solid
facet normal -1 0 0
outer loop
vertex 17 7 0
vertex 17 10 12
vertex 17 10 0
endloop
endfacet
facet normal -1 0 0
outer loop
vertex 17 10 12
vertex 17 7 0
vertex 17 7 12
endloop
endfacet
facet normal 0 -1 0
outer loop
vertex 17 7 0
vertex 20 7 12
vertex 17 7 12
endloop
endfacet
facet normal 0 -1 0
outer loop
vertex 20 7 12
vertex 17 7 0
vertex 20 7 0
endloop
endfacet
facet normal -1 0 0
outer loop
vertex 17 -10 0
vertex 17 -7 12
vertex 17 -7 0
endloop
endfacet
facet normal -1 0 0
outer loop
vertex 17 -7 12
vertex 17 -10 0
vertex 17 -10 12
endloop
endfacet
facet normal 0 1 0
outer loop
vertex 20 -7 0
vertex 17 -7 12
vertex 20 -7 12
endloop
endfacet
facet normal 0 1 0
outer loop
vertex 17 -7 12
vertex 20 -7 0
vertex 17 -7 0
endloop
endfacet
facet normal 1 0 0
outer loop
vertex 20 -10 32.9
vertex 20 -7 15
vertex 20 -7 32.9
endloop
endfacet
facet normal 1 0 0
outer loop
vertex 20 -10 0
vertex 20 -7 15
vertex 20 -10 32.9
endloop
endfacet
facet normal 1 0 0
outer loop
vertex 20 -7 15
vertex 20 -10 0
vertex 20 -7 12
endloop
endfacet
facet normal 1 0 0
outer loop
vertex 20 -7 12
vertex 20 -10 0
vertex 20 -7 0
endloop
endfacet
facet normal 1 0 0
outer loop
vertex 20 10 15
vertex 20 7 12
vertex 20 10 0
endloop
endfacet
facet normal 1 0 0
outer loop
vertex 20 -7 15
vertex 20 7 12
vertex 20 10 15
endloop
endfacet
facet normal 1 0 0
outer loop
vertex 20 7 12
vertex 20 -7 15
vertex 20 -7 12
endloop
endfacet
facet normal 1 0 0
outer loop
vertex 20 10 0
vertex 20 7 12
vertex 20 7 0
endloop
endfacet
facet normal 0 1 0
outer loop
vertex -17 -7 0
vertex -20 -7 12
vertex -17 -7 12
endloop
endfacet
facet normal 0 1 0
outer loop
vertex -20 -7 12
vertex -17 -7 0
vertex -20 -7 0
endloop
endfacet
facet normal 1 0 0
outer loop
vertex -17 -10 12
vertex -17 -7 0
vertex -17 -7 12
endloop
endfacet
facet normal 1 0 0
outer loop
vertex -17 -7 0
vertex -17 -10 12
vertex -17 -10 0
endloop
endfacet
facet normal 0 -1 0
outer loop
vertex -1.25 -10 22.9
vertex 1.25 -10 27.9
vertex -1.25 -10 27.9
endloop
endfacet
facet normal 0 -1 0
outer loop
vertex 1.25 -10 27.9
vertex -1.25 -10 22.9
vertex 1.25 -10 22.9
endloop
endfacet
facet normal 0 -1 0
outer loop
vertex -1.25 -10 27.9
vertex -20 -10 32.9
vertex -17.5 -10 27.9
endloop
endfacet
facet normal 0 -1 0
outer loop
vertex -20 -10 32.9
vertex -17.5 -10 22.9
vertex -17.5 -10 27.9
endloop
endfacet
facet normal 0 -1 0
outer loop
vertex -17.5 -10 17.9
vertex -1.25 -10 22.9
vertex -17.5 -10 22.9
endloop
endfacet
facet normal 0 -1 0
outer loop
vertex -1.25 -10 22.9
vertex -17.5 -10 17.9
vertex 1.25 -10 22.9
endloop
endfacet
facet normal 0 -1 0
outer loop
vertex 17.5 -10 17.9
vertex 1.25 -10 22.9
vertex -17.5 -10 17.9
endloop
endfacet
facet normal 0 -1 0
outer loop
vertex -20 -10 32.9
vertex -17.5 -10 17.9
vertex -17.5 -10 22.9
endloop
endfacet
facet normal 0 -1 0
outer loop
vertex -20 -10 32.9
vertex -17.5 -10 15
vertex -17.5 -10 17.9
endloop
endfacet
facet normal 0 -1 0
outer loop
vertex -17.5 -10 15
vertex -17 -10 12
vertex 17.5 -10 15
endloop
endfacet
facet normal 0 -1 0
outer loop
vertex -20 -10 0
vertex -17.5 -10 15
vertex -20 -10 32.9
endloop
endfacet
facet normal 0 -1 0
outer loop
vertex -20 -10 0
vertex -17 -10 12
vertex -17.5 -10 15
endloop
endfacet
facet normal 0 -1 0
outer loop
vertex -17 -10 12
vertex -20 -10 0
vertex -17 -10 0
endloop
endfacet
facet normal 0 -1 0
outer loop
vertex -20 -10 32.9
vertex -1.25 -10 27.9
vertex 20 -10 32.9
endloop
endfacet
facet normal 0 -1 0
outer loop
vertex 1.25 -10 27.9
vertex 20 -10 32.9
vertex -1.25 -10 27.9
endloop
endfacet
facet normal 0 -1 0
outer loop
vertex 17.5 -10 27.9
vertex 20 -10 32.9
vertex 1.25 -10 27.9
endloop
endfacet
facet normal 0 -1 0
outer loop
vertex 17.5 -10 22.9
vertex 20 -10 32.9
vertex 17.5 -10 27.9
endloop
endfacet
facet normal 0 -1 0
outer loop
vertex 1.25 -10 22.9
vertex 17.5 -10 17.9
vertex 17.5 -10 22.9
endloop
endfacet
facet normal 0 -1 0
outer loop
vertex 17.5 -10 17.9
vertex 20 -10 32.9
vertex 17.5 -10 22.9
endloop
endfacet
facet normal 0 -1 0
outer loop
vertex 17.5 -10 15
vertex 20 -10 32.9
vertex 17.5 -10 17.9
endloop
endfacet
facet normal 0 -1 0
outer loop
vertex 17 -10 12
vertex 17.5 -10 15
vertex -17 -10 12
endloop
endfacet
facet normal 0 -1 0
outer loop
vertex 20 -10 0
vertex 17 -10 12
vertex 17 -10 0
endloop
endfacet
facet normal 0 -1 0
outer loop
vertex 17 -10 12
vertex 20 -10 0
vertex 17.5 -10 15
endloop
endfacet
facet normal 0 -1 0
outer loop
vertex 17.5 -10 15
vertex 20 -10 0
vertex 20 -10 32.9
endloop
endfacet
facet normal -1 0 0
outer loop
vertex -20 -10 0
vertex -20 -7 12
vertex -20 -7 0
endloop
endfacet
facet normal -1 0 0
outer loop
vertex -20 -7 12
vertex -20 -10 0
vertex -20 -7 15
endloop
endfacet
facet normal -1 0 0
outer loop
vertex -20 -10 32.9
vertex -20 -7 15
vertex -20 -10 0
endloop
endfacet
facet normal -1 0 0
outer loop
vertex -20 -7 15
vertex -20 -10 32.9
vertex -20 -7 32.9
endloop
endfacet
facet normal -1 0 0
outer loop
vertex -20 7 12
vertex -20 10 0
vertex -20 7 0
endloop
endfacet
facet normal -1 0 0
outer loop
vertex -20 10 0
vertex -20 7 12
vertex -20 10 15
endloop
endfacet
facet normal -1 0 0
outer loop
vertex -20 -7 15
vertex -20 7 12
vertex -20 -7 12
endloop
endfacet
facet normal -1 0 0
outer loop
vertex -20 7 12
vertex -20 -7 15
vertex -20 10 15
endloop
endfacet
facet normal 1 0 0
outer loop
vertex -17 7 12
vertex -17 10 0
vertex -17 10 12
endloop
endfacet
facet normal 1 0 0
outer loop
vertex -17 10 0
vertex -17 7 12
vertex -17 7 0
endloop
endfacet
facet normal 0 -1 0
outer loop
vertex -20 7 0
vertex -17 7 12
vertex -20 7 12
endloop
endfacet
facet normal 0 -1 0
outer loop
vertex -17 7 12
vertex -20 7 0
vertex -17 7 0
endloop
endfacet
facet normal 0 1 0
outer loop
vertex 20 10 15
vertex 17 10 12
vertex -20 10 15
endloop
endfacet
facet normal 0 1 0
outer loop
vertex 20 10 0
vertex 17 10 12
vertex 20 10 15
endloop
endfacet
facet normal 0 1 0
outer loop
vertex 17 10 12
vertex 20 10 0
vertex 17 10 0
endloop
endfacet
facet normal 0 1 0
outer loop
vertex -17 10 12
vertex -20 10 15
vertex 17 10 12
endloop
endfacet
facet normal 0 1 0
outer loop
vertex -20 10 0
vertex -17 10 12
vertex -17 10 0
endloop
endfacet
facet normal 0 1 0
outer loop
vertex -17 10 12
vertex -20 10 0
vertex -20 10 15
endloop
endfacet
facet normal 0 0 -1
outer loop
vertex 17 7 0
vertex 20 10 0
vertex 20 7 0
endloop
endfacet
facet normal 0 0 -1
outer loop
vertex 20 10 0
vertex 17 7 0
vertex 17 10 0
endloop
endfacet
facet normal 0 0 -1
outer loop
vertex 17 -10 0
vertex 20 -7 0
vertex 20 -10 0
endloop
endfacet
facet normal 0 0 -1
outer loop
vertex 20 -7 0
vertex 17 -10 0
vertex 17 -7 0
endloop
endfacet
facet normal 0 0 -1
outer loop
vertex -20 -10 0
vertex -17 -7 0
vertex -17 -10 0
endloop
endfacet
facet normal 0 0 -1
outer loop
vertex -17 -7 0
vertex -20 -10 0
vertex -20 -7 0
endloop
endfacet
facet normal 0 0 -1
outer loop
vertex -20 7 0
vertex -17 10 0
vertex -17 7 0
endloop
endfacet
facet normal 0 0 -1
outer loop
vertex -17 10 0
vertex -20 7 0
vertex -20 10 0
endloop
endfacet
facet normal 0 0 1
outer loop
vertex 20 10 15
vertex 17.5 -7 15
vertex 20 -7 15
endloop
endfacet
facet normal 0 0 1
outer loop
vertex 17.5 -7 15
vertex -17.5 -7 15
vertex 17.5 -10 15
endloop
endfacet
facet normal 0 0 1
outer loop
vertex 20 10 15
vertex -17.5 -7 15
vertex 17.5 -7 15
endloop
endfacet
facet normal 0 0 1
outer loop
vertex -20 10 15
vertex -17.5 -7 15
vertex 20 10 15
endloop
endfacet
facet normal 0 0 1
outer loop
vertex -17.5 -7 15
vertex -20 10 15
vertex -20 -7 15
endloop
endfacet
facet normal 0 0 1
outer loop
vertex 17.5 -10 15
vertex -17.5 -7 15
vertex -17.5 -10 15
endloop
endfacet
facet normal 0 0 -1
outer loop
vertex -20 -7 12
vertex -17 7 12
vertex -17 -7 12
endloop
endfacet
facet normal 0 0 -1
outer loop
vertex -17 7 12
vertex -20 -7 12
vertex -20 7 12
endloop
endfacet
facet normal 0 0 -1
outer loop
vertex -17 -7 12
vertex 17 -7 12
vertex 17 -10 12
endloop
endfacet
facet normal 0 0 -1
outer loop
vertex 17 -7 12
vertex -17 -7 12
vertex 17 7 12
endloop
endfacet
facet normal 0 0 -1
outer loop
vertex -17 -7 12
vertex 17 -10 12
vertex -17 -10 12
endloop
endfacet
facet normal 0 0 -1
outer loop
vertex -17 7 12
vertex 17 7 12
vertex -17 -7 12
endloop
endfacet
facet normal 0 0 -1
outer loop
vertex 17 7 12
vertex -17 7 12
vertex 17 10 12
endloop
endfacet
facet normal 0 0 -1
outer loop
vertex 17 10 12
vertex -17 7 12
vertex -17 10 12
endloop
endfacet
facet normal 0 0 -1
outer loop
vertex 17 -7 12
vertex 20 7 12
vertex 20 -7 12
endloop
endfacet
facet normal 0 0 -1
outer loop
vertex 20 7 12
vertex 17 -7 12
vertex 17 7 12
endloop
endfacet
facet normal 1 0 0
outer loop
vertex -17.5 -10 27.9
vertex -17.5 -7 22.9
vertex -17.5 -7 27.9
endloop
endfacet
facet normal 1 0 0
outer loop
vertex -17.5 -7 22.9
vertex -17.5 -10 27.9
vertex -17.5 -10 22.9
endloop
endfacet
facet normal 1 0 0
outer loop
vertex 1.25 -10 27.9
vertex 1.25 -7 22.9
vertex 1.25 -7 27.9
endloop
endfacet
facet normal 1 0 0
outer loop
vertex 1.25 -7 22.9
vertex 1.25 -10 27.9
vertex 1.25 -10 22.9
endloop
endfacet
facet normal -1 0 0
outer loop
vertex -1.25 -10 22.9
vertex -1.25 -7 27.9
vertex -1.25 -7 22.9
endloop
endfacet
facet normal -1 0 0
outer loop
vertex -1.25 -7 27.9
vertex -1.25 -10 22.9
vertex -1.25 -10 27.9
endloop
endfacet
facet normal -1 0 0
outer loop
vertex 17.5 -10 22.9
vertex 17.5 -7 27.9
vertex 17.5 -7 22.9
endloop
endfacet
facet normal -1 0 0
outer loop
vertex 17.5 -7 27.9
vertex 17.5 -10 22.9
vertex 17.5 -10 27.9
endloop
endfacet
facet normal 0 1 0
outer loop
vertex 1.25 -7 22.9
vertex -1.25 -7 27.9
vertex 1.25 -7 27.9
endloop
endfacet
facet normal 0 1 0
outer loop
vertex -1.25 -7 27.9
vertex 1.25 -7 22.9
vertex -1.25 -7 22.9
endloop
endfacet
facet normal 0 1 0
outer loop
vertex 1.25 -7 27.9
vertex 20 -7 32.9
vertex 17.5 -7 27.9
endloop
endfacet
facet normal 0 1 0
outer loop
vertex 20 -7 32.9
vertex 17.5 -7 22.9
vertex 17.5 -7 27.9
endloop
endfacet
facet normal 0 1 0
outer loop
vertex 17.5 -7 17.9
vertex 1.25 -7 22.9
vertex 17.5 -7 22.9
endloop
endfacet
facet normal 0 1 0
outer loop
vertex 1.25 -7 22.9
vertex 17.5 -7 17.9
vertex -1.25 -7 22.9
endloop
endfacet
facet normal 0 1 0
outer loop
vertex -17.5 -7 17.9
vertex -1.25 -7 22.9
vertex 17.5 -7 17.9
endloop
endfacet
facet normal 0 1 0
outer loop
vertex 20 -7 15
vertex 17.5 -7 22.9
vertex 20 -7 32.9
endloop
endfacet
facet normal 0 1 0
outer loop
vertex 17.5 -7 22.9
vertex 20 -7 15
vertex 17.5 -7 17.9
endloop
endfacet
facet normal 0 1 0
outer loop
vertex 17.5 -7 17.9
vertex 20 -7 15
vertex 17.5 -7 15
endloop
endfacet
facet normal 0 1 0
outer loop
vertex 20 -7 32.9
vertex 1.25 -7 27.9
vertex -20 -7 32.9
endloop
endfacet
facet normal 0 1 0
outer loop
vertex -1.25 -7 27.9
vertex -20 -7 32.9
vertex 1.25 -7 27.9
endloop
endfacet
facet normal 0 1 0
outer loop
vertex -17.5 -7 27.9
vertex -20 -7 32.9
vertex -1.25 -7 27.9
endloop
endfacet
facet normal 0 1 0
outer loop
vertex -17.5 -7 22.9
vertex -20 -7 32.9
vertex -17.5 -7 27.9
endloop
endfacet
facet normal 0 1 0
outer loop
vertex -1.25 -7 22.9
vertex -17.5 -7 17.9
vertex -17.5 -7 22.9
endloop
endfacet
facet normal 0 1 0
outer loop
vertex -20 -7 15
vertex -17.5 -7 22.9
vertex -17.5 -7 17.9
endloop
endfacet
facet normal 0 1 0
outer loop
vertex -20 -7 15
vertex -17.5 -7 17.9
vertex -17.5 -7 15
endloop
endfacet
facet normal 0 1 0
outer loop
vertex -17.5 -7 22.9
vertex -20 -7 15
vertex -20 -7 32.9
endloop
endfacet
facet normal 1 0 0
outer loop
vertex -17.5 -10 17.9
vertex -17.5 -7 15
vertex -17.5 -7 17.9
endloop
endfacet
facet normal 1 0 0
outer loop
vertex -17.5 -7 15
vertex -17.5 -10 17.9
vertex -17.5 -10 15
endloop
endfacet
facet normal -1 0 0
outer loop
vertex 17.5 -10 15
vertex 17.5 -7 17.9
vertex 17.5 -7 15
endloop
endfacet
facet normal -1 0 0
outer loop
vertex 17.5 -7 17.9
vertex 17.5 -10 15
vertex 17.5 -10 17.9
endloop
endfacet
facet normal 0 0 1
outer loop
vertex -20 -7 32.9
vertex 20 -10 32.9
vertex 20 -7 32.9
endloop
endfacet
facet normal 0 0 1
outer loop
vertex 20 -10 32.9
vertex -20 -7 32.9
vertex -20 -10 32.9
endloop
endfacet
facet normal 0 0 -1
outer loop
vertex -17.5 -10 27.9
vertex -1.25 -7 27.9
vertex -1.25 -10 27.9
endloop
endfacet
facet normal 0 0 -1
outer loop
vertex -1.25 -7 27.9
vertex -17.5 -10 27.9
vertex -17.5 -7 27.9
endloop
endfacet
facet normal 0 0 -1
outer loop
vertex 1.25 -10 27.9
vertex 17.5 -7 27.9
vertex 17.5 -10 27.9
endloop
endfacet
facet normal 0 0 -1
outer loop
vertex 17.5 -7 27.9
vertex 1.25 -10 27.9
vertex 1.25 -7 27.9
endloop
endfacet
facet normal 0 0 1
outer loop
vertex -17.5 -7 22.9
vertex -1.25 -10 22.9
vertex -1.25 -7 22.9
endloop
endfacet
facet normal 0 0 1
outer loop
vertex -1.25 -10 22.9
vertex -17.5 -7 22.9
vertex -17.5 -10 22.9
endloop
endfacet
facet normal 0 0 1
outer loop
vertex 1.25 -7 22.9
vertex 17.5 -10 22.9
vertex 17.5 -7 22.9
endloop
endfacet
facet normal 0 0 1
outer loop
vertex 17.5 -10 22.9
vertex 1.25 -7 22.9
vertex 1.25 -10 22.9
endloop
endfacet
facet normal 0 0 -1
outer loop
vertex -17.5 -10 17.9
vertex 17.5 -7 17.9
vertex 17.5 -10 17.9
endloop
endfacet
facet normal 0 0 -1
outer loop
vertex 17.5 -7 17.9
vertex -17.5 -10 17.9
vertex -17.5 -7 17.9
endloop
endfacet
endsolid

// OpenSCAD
length = 20;
width  =25;
depth = 3.5;;

// parametersfor the  legs  - legs have square cross section

cross =3;
leg_length =20;





echo(" length table is ", length, " mm");
 echo(" width table is ", width, " mm");
echo(" depth table top is ", depth, " mm");
 echo(" width table leg is ", cross, " mm");
 echo(" height table leg is ", leg_length, " mm");
 echo(" overall height table  is ", leg_length + depth, " mm");


overall_height = 25;
leg_len =3;
width_vertical_bar = 3;
width_horizontal_bar =7;

overall_width = width;
thickness =cross;


union()
{
translate([0,0,leg_length+depth])
rotate([180,0,0])
table();
translate([0,-l+thickness,hoh + leg_len + leg_length +  depth-0.1 ])
rotate([90,0,0])
chair_back();

}





l = length/2;
w = width/2;

how = overall_width/2;
hoh = overall_height/2;
ll = -hoh - leg_len;
wvb = width_vertical_bar;
whb = width_horizontal_bar;
hwvb = wvb/2;









module table()
{

/*
   polyhedron command
  by pmoews
*/
polyhedron
       (points = [
                 [ -w,  l, 0],
                 [ -w, -l, 0],
                 [  w, -l, 0],
                 [  w,  l, 0],
                 [ -w,  l,  depth],
                 [ -w, -l,  depth],
                 [  w, -l,  depth],
                 [  w,  l,  depth],
                 [  w-cross, -l,  depth],
                 [  w-cross, cross-l,  depth],
                 [  w, cross-l,  depth],
                 [  w, -l,  leg_length + depth],
                 [  w-cross, -l,  leg_length + depth],
                 [  w-cross, cross-l,  leg_length + depth],
                 [  w, cross-l,  leg_length + depth],
                 [  w,  l-cross,  depth],
                 [  w-cross,  l-cross,  depth],
                 [  w-cross,  l,  depth],
                 [  w,  l,  leg_length + depth],
                 [  w,  l-cross,  leg_length + depth],
                 [  w-cross,  l-cross,  leg_length + depth],
                 [  w-cross,  l,  leg_length + depth],
                 [ cross-w,  l,  depth],
                 [ cross-w,  l-cross,  depth],
                 [ -w,  l-cross,  depth],
                 [ -w,  l,  leg_length + depth],
                 [ cross-w,  l,  leg_length + depth],
                 [ cross-w,  l-cross,  leg_length + depth],
                 [ -w,  l-cross,  leg_length + depth],
                 [ -w, cross-l,  depth],
                 [ cross-w, cross-l,  depth],
                 [ cross-w, -l,  depth],
                 [ -w, -l,  leg_length + depth],
                 [ -w, cross-l,  leg_length + depth],
                 [ cross-w, cross-l,  leg_length + depth],
                 [ cross-w, -l,  leg_length + depth],
                ],
           triangles = [
                 [   14,   10,   11],[    6,   11,   10],
                 [   11,    6,   12],[    8,   12,    6],
                 [   12,    8,   13],[    9,   13,    8],
                 [   13,    9,   14],[    9,   10,   14],
                 [   17,   21,   16],[   20,   16,   21],
                 [   16,   20,   15],[   19,   15,   20],
                 [   15,   19,    7],[   18,    7,   19],
                 [    7,   18,   17],[   18,   21,   17],
                 [   24,   28,   23],[   27,   23,   28],
                 [   23,   27,   22],[   26,   22,   27],
                 [   22,   26,    4],[   25,    4,   26],
                 [    4,   25,   24],[   25,   28,   24],
                 [   31,   35,   30],[   34,   30,   35],
                 [   30,   34,   29],[   33,   29,   34],
                 [   29,   33,    5],[   32,    5,   33],
                 [    5,   32,   31],[   32,   35,   31],
                 [   13,   14,   11],[   13,   11,   12],
                 [   20,   21,   18],[   20,   18,   19],
                 [   27,   28,   25],[   27,   25,   26],
                 [   34,   35,   32],[   34,   32,   33],
                 [    2,    3,    0],[    2,    0,    1],
                 [   16,    9,   30],[   16,   30,   23],
                 [   10,    2,    6],[    7,    3,   15],
                 [   10,   15,    3],[   10,    3,    2],
                 [    7,   17,    3],[   22,    4,    0],
                 [    0,    3,   17],[    0,   17,   22],
                 [    4,   24,    0],[   29,    5,    1],
                 [    1,    0,   24],[    1,   24,   29],
                 [    5,   31,    1],[    8,    6,    2],
                 [    2,    1,   31],[    2,   31,    8],
                 [   10,    9,   16],[   10,   16,   15],
                 [   24,   23,   30],[   24,   30,   29],
                 [    9,    8,   31],[    9,   31,   30],
                 [   17,   16,   23],[   17,   23,   22],
                 ]
      );

}



module chair_back()
{


/*
   polyhedron command by
   pmoews
*/
polyhedron
       (points = [
                 [ -how, -hoh + whb,   0.0],
                 [ -how + wvb, -hoh + whb,   0.0],
                 [  -hwvb, -hoh + whb,   0.0],
                 [   hwvb, -hoh + whb,   0.0],
                 [  how - wvb, -hoh + whb,   0.0],
                 [  how, -hoh + whb,   0.0],
                 [  how,  hoh - whb,   0.0],
                 [  how - wvb,  hoh - whb,   0.0],
                 [   hwvb,  hoh - whb,   0.0],
                 [  -hwvb,  hoh - whb,   0.0],
                 [ -how + wvb,  hoh - whb,   0.0],
                 [ -how,  hoh - whb,   0.0],
                 [  how,  hoh,   0.0],
                 [  how - wvb,  hoh,   0.0],
                 [   hwvb,  hoh,   0.0],
                 [  -hwvb,  hoh,   0.0],
                 [ -how + wvb,  hoh,   0.0],
                 [ -how,  hoh,   0.0],
                 [ -how, -hoh,   0.0],
                 [ -how + wvb, -hoh,   0.0],
                 [  -hwvb, -hoh,   0.0],
                 [   hwvb, -hoh,   0.0],
                 [  how - wvb, -hoh,   0.0],
                 [  how, -hoh,   0.0],
                 [  how, ll,   0.0],
                 [  how - wvb, ll,   0.0],
                 [ -how + wvb, ll,   0.0],
                 [ -how, ll,   0.0],
                 [ -how, -hoh + whb,   thickness],
                 [ -how + wvb, -hoh + whb,   thickness],
                 [  -hwvb, -hoh + whb,   thickness],
                 [   hwvb, -hoh + whb,   thickness],
                 [  how - wvb, -hoh + whb,   thickness],
                 [  how, -hoh + whb,   thickness],
                 [  how,  hoh - whb,   thickness],
                 [  how - wvb,  hoh - whb,   thickness],
                 [   hwvb,  hoh - whb,   thickness],
                 [  -hwvb,  hoh - whb,   thickness],
                 [ -how + wvb,  hoh - whb,   thickness],
                 [ -how,  hoh - whb,   thickness],
                 [  how,  hoh,   thickness],
                 [  how - wvb,  hoh,   thickness],
                 [   hwvb,  hoh,   thickness],
                 [  -hwvb,  hoh,   thickness],
                 [ -how + wvb,  hoh,   thickness],
                 [ -how,  hoh,   thickness],
                 [ -how, -hoh,   thickness],
                 [ -how + wvb, -hoh,   thickness],
                 [  -hwvb, -hoh,   thickness],
                 [   hwvb, -hoh,   thickness],
                 [  how - wvb, -hoh,   thickness],
                 [  how, -hoh,   thickness],
                 [  how, ll,   thickness],
                 [  how - wvb, ll,   thickness],
                 [ -how + wvb, ll,   thickness],
                 [ -how, ll,   thickness],
                ],
           triangles = [
                 [   11,    0,   10],[    1,   10,    0],
                 [   10,    1,   38],[   29,   38,    1],
                 [   38,   29,   39],[   28,   39,   29],
                 [   39,   28,   11],[   28,    0,   11],
                 [    9,    2,    8],[    3,    8,    2],
                 [    8,    3,   36],[   31,   36,    3],
                 [   36,   31,   37],[   30,   37,   31],
                 [   37,   30,    9],[   30,    2,    9],
                 [    7,    4,    6],[    5,    6,    4],
                 [    6,    5,   34],[   33,   34,    5],
                 [   34,   33,   35],[   32,   35,   33],
                 [   35,   32,    7],[   32,    4,    7],
                 [   18,   27,   19],[   26,   19,   27],
                 [   19,   26,   47],[   54,   47,   26],
                 [   47,   54,   46],[   55,   46,   54],
                 [   46,   55,   18],[   55,   27,   18],
                 [   22,   25,   23],[   24,   23,   25],
                 [   23,   24,   51],[   52,   51,   24],
                 [   51,   52,   50],[   53,   50,   52],
                 [   50,   53,   22],[   53,   25,   22],
                 [   24,   25,   53],[   24,   53,   52],
                 [   26,   27,   55],[   26,   55,   54],
                 [   16,   17,   11],[   16,   11,   10],
                 [   15,   16,   10],[   15,   10,    9],
                 [   14,   15,    9],[   14,    9,    8],
                 [   13,   14,    8],[   13,    8,    7],
                 [   12,   13,    7],[   12,    7,    6],
                 [   38,   39,   45],[   38,   45,   44],
                 [   37,   38,   44],[   37,   44,   43],
                 [   36,   37,   43],[   36,   43,   42],
                 [   35,   36,   42],[   35,   42,   41],
                 [   34,   35,   41],[   34,   41,   40],
                 [    1,    0,   18],[    1,   18,   19],
                 [    2,    1,   19],[    2,   19,   20],
                 [    3,    2,   20],[    3,   20,   21],
                 [    4,    3,   21],[    4,   21,   22],
                 [    5,    4,   22],[    5,   22,   23],
                 [   47,   46,   28],[   47,   28,   29],
                 [   48,   47,   29],[   48,   29,   30],
                 [   49,   48,   30],[   49,   30,   31],
                 [   50,   49,   31],[   50,   31,   32],
                 [   51,   50,   32],[   51,   32,   33],
                 [   45,   17,   16],[   45,   16,   44],
                 [   44,   16,   15],[   44,   15,   43],
                 [   43,   15,   14],[   43,   14,   42],
                 [   42,   14,   13],[   42,   13,   41],
                 [   41,   13,   12],[   41,   12,   40],
                 [   11,   17,   45],[   11,   45,   39],
                 [   12,    6,   34],[   12,   34,   40],
                 [    9,   10,   38],[    9,   38,   37],
                 [    7,    8,   36],[    7,   36,   35],
                 [   18,    0,   28],[   18,   28,   46],
                 [   23,   51,   33],[   23,   33,    5],
                 [   30,   29,    1],[   30,    1,    2],
                 [   32,   31,    3],[   32,    3,    4],
                 [   20,   19,   47],[   20,   47,   48],
                 [   22,   21,   49],[   22,   49,   50],
                 [   21,   20,   48],[   21,   48,   49],
                 ]                   );
}





//parameters used to make bench.stl


length = 20;
width  =40;
depth = 3;

// parameters leg  - legs have square cross section

cross =3;
leg_length =12;

overall_height = 15;
leg_len =3;
width_vertical_bar = 2.5;
width_horizontal_bar = 5;
